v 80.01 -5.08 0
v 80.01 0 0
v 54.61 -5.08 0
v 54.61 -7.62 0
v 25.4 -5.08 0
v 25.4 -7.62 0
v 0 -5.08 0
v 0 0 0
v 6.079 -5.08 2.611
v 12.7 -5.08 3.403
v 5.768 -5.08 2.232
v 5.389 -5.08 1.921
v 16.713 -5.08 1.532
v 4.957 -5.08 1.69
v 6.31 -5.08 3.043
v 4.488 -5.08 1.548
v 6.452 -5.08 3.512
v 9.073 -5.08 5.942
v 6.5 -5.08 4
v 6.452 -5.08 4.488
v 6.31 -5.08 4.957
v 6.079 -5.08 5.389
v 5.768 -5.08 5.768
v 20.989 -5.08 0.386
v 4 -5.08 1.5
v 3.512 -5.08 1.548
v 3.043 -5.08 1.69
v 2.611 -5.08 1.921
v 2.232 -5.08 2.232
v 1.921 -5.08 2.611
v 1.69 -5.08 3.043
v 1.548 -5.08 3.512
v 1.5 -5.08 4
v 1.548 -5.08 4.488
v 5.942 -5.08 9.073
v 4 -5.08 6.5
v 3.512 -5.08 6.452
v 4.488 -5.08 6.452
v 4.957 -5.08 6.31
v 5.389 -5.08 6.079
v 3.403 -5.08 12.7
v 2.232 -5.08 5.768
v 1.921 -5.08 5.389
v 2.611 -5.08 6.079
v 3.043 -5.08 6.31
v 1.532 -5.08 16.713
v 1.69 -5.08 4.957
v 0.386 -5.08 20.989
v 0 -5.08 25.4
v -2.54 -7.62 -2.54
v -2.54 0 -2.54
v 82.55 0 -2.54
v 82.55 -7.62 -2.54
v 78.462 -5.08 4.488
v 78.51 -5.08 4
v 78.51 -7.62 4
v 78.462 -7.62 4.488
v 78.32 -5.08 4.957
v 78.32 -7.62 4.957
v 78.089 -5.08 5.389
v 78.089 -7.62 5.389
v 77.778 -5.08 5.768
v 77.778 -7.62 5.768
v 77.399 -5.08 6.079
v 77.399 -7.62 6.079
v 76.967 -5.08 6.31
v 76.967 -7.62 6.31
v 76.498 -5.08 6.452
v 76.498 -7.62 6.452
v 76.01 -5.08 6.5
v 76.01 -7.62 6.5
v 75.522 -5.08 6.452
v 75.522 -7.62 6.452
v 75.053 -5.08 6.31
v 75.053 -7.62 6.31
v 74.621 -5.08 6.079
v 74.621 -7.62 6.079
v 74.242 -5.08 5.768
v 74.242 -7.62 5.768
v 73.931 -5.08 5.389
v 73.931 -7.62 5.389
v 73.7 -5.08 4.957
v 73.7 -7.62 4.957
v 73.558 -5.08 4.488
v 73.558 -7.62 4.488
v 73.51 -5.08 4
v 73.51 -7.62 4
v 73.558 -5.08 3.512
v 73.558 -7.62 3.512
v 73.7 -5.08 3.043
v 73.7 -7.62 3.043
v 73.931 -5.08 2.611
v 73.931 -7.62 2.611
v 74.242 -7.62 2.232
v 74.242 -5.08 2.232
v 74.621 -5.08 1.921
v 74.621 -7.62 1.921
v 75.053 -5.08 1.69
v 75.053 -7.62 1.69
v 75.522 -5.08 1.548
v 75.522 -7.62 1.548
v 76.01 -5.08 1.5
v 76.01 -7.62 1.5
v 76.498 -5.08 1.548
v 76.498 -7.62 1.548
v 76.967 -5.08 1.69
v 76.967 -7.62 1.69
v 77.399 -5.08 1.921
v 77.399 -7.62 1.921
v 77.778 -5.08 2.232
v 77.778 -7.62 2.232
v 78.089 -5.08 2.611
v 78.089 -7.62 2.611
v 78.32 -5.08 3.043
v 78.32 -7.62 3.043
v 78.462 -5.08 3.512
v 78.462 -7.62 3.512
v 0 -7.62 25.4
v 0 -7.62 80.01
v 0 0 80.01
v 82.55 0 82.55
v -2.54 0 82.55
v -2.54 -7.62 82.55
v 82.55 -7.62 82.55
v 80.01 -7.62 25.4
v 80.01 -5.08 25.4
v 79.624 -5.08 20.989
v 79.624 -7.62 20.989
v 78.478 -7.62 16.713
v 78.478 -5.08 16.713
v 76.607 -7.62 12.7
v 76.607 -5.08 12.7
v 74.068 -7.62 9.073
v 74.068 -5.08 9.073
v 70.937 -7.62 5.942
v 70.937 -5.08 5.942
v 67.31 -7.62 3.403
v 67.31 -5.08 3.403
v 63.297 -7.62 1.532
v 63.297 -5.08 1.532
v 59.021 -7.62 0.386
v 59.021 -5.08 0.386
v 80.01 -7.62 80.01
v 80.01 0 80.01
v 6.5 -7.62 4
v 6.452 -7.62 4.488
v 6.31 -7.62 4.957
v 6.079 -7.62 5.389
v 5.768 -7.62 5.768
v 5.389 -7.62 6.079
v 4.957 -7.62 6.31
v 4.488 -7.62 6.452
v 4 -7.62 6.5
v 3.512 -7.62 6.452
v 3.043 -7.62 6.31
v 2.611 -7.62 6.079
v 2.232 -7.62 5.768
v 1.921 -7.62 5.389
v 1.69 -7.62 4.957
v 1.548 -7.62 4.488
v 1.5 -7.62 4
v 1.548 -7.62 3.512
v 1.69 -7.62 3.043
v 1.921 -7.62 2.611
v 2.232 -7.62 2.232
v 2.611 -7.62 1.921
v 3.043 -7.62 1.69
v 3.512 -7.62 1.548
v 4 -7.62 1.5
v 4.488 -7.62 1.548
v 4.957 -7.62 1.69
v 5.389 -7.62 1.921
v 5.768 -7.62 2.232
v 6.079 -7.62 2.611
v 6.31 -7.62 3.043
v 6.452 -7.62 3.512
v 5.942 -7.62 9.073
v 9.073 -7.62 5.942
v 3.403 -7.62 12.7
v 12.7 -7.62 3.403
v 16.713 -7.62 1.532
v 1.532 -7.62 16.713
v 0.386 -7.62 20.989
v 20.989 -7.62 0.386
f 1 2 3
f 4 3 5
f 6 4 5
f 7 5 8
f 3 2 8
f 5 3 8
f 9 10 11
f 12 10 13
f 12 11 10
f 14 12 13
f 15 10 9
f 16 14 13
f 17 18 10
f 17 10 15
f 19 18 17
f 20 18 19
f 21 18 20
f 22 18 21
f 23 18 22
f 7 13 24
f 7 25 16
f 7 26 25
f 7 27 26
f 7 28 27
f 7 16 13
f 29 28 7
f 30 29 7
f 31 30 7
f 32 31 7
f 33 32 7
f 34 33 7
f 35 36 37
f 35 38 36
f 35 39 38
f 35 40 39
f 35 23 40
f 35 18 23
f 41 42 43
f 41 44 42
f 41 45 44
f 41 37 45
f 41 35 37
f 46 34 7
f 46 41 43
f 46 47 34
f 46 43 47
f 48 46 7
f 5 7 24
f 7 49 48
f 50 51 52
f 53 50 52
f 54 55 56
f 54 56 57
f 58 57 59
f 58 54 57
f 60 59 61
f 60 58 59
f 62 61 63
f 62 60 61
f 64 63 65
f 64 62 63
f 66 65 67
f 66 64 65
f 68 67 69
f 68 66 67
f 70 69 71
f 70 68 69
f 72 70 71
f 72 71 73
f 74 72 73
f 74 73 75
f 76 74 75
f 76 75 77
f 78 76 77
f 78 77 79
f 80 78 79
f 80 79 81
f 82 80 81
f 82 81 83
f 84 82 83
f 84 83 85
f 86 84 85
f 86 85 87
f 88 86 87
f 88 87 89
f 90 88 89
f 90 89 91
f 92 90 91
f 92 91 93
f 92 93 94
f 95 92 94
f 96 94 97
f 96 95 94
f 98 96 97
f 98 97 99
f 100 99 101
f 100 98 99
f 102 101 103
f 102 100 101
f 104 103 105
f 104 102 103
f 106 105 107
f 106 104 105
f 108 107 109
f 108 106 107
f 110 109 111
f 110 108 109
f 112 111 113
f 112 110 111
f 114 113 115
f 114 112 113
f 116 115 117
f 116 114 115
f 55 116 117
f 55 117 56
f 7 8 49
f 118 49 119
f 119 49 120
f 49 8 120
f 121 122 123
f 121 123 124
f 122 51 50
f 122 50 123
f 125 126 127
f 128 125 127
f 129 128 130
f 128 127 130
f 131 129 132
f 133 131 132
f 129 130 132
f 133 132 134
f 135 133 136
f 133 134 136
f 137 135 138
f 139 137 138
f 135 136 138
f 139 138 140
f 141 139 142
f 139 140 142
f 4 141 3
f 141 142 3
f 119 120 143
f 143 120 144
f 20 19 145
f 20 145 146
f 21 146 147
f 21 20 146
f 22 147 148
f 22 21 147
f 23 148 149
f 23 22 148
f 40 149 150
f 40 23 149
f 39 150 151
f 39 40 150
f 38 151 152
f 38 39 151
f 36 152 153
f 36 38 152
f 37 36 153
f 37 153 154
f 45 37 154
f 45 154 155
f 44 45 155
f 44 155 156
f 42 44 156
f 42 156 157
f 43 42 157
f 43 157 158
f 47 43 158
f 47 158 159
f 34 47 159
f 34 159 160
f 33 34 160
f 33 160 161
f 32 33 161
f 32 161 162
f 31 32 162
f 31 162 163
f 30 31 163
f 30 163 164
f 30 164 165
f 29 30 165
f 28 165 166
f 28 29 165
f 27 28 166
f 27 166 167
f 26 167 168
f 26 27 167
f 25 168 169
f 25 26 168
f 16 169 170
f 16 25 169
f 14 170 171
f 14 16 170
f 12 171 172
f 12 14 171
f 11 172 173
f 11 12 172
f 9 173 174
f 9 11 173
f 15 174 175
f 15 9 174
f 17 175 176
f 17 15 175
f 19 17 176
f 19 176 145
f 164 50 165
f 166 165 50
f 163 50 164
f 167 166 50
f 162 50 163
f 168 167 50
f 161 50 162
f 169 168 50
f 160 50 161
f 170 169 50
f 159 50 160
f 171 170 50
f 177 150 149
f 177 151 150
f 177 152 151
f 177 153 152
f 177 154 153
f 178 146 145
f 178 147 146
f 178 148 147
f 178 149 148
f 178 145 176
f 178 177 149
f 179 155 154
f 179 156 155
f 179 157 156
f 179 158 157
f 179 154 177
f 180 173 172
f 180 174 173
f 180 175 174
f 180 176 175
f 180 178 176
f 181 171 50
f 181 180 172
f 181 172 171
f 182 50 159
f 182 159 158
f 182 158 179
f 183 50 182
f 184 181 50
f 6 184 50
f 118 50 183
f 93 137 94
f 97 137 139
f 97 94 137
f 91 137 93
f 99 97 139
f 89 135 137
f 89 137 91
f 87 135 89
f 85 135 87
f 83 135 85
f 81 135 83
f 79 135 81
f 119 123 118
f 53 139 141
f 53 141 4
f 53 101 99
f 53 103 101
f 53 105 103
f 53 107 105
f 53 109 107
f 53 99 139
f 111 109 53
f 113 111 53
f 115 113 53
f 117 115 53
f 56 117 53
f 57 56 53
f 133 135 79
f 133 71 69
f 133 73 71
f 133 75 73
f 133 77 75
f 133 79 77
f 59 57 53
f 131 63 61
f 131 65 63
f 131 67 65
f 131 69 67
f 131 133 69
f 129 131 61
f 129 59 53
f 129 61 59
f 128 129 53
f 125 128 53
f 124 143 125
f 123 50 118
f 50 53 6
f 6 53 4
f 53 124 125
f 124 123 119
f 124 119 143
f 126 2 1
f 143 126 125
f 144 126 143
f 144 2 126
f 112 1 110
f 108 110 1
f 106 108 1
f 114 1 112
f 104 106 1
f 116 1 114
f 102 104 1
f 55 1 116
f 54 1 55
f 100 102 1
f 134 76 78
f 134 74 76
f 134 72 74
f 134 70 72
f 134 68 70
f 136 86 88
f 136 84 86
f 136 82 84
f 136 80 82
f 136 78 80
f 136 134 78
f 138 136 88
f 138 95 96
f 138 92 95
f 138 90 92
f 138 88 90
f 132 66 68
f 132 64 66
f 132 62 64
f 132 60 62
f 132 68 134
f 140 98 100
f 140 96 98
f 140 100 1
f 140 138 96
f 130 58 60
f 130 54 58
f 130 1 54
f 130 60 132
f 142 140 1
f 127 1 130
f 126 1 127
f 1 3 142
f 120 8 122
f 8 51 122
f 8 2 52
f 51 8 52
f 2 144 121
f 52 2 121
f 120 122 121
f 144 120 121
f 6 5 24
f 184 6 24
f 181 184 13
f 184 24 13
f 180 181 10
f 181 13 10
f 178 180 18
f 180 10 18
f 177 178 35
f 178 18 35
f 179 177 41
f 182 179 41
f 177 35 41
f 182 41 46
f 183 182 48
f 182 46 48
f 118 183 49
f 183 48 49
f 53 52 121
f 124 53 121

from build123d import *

# Parameters (mm, degrees)
F0_W     = 85.09
F0_H     = 85.09
F0_R     = 2.5
F1_DEPTH = 7.62
F2_W     = 80.01
F2_H     = 80.01
F3_DEPTH = 5.08


with BuildPart() as f1:
    # F0 (on Front) → F1 (new body)
    with BuildSketch(Plane.XZ):
        with Locations((40.005, 40.005)):
            Rectangle(F0_W, F0_H)
        with Locations((4, 4)):
            Circle(F0_R, mode=Mode.SUBTRACT)
        with Locations((76.01, 4)):
            Circle(F0_R, mode=Mode.SUBTRACT)
        with BuildLine():
            ThreePointArc((25.4, 0), (7.439488, 7.439488), (0, 25.4))
            Line((0, 25.4), (0, 80.01))
            Line((0, 80.01), (80.01, 80.01))
            Line((80.01, 80.01), (80.01, 25.4))
            ThreePointArc((80.01, 25.4), (72.570512, 7.439488), (54.61, 0))
            Line((54.61, 0), (25.4, 0))
        make_face(mode=Mode.SUBTRACT)
    extrude(amount=F1_DEPTH)

    # F2 (on face) → F3 (cut)
    with BuildSketch(Plane(origin=(0, 0, 0), x_dir=(-1, 0, 0), z_dir=(0, 1, 0))):
        with Locations((-40.005, 40.005)):
            Rectangle(F2_W, F2_H)
    extrude(amount=-F3_DEPTH, mode=Mode.SUBTRACT)


solid = f1.part
